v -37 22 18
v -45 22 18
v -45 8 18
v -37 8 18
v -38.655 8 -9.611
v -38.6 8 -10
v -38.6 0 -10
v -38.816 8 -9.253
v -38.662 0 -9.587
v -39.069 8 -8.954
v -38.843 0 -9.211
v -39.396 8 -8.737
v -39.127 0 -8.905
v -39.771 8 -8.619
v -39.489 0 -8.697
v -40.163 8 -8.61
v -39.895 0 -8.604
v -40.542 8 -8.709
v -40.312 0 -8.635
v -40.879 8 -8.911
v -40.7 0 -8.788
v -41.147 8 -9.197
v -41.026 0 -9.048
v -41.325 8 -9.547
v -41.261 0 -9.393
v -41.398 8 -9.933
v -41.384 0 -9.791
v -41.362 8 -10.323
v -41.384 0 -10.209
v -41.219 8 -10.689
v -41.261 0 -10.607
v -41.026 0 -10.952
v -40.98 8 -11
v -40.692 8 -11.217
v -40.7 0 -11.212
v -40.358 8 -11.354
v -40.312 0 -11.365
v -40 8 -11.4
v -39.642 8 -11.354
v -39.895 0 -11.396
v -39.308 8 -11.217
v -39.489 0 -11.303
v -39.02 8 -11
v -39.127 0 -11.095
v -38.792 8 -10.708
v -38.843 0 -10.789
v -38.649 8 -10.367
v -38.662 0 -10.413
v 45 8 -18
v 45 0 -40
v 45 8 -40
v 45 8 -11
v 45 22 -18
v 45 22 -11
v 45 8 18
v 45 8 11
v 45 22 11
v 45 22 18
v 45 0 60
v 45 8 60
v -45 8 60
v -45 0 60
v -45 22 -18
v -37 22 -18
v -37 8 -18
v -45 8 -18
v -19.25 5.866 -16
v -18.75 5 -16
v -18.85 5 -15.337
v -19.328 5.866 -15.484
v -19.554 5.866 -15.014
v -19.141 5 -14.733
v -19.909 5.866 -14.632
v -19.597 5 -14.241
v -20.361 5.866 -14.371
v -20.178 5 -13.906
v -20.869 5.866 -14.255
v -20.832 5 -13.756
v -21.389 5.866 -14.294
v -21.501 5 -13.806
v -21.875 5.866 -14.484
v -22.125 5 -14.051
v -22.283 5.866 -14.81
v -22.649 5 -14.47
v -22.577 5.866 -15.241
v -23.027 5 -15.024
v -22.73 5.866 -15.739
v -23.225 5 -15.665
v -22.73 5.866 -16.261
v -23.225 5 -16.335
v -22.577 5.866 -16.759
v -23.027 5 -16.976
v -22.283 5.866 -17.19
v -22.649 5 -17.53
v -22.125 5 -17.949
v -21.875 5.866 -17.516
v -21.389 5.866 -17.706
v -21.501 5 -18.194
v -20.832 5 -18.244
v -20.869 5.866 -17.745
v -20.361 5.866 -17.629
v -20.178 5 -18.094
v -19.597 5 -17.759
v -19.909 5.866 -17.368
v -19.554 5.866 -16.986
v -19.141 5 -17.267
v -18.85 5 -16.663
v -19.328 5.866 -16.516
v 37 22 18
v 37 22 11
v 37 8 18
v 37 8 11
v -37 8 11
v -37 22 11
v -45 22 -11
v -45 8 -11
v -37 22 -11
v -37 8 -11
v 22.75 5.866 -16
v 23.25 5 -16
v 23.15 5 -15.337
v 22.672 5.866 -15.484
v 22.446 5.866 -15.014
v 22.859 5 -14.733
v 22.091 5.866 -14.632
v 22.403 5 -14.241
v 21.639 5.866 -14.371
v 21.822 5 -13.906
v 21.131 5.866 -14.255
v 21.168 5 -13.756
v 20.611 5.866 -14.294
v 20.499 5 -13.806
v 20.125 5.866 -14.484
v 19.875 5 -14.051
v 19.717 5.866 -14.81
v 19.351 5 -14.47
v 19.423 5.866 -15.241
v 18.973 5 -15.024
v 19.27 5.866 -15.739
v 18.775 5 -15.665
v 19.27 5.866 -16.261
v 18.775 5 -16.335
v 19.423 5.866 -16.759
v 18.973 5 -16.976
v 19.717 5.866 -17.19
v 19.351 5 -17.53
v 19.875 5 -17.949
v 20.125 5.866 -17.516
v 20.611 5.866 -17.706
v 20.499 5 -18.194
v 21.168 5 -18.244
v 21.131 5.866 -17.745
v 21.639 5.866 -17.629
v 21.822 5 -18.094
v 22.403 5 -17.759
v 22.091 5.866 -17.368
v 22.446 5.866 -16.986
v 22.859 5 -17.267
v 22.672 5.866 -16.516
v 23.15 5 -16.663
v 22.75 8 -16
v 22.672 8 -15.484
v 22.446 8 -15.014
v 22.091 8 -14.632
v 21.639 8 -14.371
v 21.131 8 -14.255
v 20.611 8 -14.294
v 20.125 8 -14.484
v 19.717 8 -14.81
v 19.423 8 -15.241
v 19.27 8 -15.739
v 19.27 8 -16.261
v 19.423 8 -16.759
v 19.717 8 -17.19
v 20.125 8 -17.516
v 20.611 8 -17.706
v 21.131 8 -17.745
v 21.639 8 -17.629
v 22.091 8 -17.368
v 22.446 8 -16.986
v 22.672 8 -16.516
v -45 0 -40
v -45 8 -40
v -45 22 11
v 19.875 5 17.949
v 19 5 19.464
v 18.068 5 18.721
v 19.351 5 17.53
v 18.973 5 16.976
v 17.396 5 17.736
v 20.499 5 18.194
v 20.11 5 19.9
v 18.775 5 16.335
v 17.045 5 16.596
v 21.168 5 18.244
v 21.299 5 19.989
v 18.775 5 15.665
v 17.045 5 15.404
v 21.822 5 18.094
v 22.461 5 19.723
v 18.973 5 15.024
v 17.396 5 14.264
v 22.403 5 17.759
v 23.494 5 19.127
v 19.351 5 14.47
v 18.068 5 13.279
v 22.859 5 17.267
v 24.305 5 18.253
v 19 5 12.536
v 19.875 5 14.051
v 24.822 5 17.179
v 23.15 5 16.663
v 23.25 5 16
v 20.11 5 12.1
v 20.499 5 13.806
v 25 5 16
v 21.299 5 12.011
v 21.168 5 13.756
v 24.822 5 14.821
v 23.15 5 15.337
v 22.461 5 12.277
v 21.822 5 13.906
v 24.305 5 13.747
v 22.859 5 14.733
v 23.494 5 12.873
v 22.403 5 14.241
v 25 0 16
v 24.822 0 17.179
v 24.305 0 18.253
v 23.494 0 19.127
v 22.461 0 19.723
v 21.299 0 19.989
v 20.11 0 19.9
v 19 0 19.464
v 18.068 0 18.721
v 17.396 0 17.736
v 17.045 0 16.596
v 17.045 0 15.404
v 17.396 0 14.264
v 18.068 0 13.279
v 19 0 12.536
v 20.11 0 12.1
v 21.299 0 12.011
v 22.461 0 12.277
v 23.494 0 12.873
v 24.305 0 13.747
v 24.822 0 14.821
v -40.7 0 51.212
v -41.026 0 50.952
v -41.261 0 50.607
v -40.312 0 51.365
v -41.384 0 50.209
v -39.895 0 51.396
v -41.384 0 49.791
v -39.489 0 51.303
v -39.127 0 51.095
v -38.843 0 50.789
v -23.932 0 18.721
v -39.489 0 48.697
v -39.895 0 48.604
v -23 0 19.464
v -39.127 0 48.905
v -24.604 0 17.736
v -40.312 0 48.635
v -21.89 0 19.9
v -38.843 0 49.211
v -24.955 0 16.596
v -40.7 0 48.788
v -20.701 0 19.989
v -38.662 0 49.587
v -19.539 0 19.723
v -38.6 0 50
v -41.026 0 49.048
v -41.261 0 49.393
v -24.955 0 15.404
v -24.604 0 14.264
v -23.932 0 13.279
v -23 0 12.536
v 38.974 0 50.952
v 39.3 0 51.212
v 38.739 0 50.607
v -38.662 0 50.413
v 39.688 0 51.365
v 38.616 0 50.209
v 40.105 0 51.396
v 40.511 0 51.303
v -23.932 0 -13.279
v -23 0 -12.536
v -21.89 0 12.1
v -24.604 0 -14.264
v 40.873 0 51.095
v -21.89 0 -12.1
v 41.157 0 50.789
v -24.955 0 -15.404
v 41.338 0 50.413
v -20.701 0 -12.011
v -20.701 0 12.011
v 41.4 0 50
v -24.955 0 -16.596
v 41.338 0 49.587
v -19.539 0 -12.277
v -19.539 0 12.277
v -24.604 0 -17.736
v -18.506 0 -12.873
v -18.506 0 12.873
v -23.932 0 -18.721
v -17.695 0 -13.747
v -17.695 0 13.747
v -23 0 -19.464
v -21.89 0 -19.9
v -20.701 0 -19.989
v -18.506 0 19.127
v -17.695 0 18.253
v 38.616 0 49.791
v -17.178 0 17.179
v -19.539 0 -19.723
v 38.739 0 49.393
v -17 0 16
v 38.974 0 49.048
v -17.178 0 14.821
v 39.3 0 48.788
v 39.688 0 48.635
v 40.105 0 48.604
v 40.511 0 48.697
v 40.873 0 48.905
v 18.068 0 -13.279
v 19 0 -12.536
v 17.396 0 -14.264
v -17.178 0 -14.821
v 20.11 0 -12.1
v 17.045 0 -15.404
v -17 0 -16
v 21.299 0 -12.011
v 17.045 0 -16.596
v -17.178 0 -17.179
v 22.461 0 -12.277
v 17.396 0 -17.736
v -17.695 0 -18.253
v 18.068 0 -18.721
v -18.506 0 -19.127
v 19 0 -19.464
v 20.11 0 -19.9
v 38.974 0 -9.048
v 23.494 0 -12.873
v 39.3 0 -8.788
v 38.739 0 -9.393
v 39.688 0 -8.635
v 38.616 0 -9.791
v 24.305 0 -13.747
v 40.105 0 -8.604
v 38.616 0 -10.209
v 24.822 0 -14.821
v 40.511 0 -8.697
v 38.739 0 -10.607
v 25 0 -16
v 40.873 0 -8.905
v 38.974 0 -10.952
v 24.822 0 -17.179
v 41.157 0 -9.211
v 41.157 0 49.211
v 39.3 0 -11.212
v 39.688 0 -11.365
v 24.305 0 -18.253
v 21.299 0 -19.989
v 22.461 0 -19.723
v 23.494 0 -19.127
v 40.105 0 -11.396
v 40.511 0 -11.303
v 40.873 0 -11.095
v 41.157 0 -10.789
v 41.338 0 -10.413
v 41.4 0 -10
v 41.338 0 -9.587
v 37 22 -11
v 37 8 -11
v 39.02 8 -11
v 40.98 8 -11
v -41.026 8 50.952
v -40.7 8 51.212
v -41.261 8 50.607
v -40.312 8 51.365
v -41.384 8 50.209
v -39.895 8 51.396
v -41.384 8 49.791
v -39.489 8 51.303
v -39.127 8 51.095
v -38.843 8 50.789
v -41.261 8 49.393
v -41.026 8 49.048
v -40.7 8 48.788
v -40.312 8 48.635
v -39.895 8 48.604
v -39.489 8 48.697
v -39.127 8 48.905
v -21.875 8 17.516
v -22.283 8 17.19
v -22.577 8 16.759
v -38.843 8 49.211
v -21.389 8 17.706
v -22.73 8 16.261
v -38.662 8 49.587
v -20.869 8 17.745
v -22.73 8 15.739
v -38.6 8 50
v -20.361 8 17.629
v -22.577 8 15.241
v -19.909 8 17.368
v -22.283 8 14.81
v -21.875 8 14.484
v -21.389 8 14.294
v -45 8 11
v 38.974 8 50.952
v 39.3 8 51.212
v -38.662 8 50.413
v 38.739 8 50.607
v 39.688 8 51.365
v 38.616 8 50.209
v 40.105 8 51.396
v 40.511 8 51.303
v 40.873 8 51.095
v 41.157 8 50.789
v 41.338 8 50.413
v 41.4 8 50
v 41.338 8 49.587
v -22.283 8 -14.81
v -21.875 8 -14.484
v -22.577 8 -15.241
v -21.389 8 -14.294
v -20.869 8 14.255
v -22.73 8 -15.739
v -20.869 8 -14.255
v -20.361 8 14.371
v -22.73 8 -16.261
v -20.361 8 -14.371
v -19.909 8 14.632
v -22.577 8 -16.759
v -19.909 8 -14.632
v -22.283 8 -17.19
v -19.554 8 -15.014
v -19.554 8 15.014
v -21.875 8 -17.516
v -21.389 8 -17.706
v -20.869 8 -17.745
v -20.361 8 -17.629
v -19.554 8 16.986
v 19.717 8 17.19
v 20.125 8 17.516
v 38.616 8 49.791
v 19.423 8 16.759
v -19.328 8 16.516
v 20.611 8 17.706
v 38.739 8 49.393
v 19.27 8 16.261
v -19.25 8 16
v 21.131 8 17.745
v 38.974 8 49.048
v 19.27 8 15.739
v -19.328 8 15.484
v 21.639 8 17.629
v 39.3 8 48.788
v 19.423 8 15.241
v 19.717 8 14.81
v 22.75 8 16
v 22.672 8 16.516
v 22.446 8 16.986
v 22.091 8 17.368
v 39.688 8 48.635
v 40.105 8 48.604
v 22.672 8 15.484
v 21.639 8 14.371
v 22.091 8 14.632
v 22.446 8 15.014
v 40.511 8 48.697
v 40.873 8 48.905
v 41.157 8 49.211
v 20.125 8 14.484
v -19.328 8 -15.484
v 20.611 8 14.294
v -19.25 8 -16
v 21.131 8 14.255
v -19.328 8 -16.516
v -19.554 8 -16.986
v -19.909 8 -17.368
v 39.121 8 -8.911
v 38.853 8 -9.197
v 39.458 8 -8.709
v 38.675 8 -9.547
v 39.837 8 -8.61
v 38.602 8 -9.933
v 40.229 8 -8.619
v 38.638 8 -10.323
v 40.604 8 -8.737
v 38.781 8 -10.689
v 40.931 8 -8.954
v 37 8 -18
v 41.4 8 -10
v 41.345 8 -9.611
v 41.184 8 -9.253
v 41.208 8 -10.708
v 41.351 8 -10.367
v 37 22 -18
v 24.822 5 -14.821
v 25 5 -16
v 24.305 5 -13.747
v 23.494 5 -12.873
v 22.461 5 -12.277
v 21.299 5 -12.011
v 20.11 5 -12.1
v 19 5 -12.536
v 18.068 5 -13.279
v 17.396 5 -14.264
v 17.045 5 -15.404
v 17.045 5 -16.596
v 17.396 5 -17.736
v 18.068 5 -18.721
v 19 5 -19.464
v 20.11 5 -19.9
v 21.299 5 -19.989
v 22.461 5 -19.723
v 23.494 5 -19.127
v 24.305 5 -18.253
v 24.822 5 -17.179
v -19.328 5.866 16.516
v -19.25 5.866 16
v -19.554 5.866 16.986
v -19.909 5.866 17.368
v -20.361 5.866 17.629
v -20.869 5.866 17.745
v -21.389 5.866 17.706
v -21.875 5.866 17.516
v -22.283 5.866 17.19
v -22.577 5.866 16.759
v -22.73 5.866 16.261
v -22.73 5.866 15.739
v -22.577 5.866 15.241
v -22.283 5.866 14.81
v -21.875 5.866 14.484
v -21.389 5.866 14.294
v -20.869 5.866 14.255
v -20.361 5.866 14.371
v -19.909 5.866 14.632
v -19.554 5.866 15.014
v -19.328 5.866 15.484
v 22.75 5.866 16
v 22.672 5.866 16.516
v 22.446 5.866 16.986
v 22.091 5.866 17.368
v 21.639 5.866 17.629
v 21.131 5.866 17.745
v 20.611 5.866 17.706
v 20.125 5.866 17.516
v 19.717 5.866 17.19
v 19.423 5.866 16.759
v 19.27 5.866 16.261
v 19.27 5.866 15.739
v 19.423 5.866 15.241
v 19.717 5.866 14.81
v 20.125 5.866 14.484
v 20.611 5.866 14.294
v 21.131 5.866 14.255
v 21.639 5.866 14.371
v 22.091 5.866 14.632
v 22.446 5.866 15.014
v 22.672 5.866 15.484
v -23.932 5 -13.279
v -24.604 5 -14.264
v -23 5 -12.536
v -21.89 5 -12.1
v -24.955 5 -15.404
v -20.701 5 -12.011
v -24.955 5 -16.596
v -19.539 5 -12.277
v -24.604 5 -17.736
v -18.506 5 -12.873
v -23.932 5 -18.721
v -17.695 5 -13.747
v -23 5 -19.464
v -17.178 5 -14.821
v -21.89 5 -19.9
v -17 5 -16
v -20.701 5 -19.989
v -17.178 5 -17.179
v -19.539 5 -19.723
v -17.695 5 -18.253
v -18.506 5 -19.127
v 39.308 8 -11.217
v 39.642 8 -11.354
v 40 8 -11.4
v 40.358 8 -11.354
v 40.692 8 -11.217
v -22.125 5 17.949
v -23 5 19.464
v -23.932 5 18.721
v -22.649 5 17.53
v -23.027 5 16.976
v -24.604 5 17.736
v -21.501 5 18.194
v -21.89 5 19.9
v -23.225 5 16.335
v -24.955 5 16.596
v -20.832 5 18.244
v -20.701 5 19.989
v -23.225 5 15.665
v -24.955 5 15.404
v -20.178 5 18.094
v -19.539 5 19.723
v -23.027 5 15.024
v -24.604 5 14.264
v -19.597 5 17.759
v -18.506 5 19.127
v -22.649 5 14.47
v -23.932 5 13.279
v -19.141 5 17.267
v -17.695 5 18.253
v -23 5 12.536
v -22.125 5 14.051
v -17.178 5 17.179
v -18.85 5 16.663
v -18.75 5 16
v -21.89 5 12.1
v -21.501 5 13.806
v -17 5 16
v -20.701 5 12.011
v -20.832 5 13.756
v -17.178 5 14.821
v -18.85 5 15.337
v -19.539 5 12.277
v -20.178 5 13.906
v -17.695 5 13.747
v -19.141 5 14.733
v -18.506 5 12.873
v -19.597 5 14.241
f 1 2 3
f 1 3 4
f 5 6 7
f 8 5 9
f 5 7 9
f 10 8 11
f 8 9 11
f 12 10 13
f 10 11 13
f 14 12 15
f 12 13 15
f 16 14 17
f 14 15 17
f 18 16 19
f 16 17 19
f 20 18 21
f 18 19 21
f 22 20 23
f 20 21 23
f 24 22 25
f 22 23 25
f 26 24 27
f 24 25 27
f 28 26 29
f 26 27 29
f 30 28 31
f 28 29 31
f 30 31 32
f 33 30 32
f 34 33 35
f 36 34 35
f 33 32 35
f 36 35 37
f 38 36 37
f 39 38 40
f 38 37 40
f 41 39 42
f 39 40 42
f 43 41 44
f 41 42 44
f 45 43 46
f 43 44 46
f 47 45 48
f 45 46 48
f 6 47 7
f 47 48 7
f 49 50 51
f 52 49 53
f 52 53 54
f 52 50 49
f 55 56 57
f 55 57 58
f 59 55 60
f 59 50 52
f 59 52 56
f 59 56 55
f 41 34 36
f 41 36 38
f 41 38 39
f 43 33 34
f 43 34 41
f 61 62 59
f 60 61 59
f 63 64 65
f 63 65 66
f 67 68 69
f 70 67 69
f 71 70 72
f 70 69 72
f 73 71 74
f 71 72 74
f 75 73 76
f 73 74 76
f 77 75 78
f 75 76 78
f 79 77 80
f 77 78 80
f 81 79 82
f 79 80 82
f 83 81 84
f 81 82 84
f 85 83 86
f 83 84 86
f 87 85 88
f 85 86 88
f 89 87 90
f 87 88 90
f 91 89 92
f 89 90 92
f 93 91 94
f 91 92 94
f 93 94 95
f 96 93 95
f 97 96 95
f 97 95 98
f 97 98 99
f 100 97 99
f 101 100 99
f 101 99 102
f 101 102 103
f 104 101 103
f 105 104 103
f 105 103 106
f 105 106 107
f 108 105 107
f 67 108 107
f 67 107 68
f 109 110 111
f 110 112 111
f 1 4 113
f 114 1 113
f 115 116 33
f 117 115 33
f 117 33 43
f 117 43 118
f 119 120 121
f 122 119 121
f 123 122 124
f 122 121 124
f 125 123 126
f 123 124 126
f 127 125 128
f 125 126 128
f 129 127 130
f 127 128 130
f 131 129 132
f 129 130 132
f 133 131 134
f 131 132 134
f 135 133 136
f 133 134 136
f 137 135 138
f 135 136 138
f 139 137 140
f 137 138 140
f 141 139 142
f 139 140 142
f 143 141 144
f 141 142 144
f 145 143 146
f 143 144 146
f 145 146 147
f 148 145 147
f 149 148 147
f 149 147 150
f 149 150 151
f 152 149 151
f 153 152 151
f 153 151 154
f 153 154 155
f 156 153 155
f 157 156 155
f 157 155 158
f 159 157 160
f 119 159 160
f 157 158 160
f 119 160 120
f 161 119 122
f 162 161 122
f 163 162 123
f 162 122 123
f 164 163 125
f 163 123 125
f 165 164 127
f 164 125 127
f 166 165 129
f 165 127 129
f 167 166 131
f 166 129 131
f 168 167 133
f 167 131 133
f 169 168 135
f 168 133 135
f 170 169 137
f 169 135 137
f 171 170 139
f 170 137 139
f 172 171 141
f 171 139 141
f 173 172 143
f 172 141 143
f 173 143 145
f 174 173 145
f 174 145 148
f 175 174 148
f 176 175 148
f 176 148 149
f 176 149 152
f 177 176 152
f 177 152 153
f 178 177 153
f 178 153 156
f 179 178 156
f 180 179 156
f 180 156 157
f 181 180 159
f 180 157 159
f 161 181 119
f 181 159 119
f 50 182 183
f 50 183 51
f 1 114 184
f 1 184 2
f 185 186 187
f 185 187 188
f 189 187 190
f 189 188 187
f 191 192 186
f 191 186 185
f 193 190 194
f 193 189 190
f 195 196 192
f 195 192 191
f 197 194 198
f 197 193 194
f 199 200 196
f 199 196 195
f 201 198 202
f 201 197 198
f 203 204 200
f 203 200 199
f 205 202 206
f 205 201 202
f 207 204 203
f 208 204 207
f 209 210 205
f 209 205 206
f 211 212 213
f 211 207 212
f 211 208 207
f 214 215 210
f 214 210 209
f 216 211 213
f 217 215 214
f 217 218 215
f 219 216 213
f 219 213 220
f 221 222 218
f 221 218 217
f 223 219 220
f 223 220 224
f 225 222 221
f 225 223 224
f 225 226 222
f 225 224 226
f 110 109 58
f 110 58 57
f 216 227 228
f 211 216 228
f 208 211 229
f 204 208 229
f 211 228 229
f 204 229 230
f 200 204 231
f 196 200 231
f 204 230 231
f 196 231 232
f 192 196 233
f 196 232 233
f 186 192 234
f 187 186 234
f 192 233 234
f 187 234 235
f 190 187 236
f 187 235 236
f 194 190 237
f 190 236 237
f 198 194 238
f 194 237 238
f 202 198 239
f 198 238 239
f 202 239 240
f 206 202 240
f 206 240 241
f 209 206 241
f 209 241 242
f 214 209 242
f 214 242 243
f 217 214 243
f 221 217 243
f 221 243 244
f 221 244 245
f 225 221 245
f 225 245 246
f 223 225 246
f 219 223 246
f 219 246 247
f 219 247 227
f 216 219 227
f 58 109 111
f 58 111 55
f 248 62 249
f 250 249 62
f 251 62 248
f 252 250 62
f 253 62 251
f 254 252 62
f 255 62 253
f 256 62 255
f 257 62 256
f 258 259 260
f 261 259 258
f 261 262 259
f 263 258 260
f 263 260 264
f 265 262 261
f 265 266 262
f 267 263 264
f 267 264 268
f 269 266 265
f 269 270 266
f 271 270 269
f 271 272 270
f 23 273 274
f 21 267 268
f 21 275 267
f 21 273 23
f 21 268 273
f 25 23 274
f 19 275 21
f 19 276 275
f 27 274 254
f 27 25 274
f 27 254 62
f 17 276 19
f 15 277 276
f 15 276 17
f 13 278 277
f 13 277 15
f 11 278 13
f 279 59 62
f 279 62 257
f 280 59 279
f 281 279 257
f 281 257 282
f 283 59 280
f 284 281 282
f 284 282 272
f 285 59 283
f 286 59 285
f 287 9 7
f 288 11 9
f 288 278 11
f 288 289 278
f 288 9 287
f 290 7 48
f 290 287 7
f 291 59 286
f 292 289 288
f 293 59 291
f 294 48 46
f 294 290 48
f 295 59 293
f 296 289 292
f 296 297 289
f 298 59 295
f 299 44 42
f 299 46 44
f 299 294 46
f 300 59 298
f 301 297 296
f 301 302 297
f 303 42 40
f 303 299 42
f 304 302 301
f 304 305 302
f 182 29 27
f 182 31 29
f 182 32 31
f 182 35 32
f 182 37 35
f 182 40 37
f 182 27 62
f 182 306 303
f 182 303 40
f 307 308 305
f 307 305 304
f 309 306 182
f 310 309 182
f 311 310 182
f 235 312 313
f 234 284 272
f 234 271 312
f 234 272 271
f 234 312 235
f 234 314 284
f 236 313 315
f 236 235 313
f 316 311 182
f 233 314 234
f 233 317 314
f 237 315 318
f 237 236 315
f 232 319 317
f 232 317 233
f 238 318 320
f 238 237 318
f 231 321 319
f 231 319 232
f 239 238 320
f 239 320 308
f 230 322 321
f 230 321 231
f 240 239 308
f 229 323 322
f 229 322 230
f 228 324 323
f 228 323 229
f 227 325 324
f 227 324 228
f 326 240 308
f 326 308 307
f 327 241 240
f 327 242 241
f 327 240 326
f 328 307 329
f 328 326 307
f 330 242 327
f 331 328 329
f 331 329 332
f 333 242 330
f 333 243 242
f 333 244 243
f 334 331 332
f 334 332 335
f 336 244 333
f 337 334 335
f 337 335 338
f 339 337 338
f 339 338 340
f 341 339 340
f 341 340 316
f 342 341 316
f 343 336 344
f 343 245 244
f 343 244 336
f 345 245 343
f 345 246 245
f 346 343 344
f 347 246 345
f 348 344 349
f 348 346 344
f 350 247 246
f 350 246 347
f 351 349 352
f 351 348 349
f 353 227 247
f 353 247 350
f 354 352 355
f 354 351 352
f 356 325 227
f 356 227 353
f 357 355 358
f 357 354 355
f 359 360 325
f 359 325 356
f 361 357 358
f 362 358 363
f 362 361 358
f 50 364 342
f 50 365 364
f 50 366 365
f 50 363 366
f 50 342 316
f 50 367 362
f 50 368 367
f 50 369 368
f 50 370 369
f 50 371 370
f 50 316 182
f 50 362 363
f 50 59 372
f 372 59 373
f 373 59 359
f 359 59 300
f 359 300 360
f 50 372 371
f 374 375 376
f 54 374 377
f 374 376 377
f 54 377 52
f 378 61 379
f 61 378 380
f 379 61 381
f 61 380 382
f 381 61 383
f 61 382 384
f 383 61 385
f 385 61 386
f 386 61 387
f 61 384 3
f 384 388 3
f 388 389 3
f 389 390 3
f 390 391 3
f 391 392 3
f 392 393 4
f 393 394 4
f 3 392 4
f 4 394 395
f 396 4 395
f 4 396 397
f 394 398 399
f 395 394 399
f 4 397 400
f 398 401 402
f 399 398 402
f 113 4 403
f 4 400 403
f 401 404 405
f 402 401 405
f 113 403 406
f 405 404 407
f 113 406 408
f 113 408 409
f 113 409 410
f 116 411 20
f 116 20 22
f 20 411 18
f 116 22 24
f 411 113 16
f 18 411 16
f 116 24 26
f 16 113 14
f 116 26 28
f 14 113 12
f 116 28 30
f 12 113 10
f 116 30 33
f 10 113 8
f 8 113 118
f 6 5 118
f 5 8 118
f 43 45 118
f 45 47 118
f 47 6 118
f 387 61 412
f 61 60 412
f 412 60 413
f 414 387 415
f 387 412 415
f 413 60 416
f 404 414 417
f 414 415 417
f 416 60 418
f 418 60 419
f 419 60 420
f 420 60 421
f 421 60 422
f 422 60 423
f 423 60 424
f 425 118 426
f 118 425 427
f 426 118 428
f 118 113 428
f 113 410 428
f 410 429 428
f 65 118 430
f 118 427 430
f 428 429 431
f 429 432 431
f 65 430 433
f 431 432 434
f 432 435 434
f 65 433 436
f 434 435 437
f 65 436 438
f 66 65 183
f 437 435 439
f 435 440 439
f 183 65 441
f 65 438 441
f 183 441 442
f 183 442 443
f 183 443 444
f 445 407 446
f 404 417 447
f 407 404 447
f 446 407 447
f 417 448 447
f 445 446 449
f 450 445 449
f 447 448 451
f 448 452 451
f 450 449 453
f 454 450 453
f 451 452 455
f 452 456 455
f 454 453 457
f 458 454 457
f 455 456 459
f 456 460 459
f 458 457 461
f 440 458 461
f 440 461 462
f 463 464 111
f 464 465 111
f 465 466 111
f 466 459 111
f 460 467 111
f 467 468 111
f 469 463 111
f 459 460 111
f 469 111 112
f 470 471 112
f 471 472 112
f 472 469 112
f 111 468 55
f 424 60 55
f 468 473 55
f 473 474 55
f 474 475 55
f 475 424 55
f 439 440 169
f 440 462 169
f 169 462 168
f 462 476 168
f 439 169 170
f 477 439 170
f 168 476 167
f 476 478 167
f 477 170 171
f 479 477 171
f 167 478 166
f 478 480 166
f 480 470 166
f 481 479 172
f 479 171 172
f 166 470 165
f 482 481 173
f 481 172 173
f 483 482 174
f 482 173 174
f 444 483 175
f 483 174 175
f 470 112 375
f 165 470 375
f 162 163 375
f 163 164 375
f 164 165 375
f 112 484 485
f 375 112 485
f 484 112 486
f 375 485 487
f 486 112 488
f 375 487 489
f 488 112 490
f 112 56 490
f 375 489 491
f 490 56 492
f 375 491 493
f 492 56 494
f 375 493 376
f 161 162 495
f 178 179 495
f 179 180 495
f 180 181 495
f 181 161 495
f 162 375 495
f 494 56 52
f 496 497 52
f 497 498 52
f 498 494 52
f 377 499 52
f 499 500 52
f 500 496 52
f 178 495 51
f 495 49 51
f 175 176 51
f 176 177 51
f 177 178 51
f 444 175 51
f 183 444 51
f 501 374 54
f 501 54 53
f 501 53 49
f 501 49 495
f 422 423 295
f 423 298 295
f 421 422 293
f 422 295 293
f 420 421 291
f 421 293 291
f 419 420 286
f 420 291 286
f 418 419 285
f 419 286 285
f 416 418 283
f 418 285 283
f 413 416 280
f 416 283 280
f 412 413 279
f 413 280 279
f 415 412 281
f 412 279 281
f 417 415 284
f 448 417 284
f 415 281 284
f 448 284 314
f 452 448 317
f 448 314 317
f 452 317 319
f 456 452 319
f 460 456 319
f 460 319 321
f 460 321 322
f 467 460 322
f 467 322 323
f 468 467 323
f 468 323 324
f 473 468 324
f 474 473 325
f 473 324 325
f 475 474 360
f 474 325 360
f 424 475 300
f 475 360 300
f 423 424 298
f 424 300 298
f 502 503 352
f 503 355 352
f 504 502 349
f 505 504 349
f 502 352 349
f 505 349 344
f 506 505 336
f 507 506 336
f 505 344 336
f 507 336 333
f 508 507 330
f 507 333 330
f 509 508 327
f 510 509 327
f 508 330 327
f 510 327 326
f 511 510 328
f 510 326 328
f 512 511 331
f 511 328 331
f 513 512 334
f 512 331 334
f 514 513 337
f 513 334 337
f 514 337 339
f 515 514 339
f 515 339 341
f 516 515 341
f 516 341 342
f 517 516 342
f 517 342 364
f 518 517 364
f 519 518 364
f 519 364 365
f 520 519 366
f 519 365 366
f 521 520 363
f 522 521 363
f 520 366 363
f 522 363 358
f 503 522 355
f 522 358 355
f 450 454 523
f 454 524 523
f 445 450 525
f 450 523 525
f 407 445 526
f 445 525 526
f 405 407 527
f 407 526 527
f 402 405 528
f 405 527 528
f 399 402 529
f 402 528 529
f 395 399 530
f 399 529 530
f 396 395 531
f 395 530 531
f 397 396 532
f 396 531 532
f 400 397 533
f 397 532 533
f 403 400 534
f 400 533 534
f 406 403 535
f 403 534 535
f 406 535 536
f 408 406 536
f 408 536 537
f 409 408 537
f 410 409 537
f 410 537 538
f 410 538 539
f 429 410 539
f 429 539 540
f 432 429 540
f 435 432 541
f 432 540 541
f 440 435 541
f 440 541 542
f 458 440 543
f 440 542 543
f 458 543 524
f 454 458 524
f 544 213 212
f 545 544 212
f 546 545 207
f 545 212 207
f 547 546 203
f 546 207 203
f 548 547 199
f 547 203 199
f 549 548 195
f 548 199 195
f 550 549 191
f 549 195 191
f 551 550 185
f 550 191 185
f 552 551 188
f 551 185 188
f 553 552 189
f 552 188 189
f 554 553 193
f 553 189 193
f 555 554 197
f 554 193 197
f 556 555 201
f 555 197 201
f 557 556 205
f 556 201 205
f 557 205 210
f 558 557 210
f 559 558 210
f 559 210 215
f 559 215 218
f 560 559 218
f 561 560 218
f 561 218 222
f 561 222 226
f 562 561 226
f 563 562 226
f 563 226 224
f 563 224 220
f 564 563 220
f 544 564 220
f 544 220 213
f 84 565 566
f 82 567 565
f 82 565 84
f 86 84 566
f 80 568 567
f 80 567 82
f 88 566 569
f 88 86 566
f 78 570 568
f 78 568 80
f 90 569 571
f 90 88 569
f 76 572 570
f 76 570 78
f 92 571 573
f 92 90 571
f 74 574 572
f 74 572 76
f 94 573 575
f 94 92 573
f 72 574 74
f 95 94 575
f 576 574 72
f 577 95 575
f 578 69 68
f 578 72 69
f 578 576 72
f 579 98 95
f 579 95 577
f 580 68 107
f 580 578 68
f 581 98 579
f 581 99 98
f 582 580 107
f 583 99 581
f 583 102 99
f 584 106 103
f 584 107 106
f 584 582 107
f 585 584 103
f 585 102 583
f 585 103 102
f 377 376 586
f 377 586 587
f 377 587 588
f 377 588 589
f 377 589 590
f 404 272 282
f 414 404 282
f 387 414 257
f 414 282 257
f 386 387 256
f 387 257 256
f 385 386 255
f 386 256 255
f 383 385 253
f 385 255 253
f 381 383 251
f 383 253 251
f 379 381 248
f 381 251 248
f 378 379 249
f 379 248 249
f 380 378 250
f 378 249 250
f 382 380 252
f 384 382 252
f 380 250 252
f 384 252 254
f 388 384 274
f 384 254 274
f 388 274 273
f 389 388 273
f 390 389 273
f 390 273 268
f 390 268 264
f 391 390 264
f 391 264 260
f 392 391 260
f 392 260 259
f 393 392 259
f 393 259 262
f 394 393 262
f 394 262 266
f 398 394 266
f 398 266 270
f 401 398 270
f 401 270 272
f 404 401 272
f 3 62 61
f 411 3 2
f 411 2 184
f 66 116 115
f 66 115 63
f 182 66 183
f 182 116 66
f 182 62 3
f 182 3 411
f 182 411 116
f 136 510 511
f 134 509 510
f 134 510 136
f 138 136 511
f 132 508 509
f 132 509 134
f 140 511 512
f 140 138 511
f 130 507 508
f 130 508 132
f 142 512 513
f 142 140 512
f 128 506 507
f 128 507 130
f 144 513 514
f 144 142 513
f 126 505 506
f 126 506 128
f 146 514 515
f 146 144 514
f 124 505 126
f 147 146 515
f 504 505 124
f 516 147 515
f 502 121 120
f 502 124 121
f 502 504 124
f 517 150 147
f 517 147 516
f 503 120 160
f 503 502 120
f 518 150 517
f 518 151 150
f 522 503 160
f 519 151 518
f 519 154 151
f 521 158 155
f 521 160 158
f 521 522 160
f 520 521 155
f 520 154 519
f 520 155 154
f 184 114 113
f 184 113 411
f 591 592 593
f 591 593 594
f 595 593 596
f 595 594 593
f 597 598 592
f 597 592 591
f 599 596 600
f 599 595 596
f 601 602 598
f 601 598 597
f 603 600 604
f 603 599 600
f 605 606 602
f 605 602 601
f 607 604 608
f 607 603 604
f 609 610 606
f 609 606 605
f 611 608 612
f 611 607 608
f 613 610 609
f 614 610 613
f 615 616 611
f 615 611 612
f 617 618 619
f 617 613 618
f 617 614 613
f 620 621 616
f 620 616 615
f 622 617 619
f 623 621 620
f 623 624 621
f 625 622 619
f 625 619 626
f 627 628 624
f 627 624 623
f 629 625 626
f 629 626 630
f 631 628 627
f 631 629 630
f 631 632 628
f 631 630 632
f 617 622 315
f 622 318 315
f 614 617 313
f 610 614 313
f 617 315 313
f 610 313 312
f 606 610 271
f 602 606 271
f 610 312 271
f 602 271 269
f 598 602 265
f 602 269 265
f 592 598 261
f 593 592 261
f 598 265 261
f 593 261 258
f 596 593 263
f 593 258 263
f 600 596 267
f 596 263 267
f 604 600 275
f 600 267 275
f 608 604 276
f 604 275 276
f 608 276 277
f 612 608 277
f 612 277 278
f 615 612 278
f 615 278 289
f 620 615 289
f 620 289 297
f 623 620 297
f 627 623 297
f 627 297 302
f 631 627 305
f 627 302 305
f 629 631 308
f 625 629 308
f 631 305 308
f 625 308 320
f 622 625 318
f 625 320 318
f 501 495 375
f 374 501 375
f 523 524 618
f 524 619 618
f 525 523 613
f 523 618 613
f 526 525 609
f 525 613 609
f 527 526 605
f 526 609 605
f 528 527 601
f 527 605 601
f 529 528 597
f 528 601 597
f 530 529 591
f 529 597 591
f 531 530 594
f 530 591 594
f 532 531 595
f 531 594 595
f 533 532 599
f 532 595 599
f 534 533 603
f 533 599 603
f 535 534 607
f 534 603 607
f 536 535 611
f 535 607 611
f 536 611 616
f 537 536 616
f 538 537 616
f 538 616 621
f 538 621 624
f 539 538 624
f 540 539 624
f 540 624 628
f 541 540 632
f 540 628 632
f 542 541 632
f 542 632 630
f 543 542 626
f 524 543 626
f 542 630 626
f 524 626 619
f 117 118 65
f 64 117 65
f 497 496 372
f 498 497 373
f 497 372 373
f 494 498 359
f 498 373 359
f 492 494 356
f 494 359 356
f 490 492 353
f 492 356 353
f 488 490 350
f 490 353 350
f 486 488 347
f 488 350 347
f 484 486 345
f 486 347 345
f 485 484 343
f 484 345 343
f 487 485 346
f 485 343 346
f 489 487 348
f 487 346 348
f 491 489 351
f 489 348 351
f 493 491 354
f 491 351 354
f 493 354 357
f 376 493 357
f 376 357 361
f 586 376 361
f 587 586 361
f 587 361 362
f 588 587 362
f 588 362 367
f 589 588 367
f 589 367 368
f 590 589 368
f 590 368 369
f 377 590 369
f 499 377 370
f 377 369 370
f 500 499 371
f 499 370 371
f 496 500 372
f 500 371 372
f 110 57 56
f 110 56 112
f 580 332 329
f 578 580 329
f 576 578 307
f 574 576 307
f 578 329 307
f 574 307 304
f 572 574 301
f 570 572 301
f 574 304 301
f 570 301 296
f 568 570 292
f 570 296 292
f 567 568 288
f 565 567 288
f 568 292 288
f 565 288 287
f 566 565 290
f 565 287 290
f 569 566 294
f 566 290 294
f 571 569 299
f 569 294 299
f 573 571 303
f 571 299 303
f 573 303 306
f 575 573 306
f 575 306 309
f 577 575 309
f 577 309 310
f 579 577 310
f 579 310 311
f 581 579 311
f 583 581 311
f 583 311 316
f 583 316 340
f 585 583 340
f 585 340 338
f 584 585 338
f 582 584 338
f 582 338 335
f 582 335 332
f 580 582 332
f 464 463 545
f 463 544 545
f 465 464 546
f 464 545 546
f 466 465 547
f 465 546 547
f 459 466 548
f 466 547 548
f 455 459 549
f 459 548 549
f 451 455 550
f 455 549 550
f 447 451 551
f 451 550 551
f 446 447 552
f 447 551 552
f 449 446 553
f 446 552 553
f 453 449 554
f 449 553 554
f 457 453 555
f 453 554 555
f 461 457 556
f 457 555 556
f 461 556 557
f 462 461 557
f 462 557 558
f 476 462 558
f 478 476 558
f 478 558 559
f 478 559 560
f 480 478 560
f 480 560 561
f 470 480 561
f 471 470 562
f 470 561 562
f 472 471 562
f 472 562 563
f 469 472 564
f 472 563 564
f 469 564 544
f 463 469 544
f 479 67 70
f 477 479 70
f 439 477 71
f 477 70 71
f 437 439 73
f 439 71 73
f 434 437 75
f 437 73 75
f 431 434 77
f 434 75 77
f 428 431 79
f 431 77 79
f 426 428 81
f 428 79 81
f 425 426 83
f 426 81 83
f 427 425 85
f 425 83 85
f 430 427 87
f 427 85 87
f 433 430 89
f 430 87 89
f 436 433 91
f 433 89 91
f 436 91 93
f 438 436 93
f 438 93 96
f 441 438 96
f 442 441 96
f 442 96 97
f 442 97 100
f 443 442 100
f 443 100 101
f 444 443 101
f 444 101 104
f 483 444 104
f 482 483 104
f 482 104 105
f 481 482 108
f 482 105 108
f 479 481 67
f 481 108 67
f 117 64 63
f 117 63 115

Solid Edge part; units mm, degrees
sketch "Sketch1" plane through (0, 0, 0) normal (0, -1, 0) x (1, 0, 0)
  line L0 (-45, -40) -> (45, -40)
  line L1 (45, -40) -> (45, 40)
  line L2 (45, 40) -> (-45, 40)
  line L3 (-45, 40) -> (-45, -40)
  dimension "D1" = 90
  dimension "D2" = 80
extrude "Protrusion1" add sketch "Sketch1" against normal blind 8
sketch "Sketch2" plane through (0, 0, 0) normal (0, -1, 0) x (1, 0, 0)
  circle A0 centre (-21, 16) radius 4
  circle A1 centre (-21, -16) radius 4
  circle A2 centre (21, -16) radius 4
  circle A3 centre (21, 16) radius 4
extrude "Extrusionsausschnitt_2" cut sketch "Sketch2" against normal blind 5
sketch "Sketch3" plane through (0, 0, 0) normal (0, -1, 0) x (1, 0, 0)
  circle A0 centre (-21, 16) radius 1.75
  circle A1 centre (-21, -16) radius 1.75
  circle A2 centre (21, -16) radius 1.75
  circle A3 centre (21, 16) radius 1.75
  dimension "D1" = 3.5
extrude "Cutout1" cut sketch "Sketch3" against normal through all
chamfer "Fase_1" [suppressed]
chamfer "Fase_2" [suppressed]
chamfer "Fase_4" distance 0.5 angle 60 4 edges at (-21, 5, 14.25) (-21, 5, -17.75) (21, 5, 14.25) (21, 5, -17.75) measured on face at (-23.5867, 5, 18.7467) measured on face at (-23.5867, 5, -13.2533) measured on face at (18.4133, 5, 18.7467) measured on face at (18.4133, 5, -13.2533)
sketch "Sketch4" plane through (0, 8, 0) normal (0, 1, 0) x (1, 0, 0)
  line L0 (-45, 11) -> (-37, 11)
  line L1 (-37, 11) -> (-37, 18)
  line L2 (-37, 18) -> (-45, 18)
  line L3 (-45, 18) -> (-45, 11)
  dimension "D1" = 11
  dimension "D2" = 8
  dimension "D3" = 18
extrude "Extrusionsausprägung_2" add sketch "Sketch4" along normal blind 14
mirror "Mirror1" about plane through (0, 0, 0) normal (0, 0, 1) of "Extrusionsausprägung_2"
mirror "Mirror2" about plane through (0, 0, 0) normal (1, 0, 0) of "Extrusionsausprägung_2", "Mirror1"
sketch "Sketch5" plane through (0, 0, 0) normal (0, -1, 0) x (-1, 0, 0)
  line L0 (-45, -40) -> (45, -40)
  line L1 (45, -40) -> (45, -60)
  line L2 (45, -60) -> (-45, -60)
  line L3 (-45, -60) -> (-45, -40)
  dimension "D1" = 20
extrude "Protrusion5" add sketch "Sketch5" against normal up to vertex (8 mm away)
sketch "Sketch6" plane through (0, 0, 0) normal (0, -1, 0) x (1, 0, 0)
  circle A0 centre (-40, -10) radius 1.4
  circle A1 centre (40, -10) radius 1.4
  circle A2 centre (40, 50) radius 1.4
  circle A3 centre (-40, 50) radius 1.4
  dimension "D1" = 2.8
  dimension "D2" = 60
  dimension "D3" = 80
  dimension "D4" = 30
extrude "Cutout2" cut sketch "Sketch6" against normal up to vertex (8 mm away)
properties material "Nylon, allgemein"
